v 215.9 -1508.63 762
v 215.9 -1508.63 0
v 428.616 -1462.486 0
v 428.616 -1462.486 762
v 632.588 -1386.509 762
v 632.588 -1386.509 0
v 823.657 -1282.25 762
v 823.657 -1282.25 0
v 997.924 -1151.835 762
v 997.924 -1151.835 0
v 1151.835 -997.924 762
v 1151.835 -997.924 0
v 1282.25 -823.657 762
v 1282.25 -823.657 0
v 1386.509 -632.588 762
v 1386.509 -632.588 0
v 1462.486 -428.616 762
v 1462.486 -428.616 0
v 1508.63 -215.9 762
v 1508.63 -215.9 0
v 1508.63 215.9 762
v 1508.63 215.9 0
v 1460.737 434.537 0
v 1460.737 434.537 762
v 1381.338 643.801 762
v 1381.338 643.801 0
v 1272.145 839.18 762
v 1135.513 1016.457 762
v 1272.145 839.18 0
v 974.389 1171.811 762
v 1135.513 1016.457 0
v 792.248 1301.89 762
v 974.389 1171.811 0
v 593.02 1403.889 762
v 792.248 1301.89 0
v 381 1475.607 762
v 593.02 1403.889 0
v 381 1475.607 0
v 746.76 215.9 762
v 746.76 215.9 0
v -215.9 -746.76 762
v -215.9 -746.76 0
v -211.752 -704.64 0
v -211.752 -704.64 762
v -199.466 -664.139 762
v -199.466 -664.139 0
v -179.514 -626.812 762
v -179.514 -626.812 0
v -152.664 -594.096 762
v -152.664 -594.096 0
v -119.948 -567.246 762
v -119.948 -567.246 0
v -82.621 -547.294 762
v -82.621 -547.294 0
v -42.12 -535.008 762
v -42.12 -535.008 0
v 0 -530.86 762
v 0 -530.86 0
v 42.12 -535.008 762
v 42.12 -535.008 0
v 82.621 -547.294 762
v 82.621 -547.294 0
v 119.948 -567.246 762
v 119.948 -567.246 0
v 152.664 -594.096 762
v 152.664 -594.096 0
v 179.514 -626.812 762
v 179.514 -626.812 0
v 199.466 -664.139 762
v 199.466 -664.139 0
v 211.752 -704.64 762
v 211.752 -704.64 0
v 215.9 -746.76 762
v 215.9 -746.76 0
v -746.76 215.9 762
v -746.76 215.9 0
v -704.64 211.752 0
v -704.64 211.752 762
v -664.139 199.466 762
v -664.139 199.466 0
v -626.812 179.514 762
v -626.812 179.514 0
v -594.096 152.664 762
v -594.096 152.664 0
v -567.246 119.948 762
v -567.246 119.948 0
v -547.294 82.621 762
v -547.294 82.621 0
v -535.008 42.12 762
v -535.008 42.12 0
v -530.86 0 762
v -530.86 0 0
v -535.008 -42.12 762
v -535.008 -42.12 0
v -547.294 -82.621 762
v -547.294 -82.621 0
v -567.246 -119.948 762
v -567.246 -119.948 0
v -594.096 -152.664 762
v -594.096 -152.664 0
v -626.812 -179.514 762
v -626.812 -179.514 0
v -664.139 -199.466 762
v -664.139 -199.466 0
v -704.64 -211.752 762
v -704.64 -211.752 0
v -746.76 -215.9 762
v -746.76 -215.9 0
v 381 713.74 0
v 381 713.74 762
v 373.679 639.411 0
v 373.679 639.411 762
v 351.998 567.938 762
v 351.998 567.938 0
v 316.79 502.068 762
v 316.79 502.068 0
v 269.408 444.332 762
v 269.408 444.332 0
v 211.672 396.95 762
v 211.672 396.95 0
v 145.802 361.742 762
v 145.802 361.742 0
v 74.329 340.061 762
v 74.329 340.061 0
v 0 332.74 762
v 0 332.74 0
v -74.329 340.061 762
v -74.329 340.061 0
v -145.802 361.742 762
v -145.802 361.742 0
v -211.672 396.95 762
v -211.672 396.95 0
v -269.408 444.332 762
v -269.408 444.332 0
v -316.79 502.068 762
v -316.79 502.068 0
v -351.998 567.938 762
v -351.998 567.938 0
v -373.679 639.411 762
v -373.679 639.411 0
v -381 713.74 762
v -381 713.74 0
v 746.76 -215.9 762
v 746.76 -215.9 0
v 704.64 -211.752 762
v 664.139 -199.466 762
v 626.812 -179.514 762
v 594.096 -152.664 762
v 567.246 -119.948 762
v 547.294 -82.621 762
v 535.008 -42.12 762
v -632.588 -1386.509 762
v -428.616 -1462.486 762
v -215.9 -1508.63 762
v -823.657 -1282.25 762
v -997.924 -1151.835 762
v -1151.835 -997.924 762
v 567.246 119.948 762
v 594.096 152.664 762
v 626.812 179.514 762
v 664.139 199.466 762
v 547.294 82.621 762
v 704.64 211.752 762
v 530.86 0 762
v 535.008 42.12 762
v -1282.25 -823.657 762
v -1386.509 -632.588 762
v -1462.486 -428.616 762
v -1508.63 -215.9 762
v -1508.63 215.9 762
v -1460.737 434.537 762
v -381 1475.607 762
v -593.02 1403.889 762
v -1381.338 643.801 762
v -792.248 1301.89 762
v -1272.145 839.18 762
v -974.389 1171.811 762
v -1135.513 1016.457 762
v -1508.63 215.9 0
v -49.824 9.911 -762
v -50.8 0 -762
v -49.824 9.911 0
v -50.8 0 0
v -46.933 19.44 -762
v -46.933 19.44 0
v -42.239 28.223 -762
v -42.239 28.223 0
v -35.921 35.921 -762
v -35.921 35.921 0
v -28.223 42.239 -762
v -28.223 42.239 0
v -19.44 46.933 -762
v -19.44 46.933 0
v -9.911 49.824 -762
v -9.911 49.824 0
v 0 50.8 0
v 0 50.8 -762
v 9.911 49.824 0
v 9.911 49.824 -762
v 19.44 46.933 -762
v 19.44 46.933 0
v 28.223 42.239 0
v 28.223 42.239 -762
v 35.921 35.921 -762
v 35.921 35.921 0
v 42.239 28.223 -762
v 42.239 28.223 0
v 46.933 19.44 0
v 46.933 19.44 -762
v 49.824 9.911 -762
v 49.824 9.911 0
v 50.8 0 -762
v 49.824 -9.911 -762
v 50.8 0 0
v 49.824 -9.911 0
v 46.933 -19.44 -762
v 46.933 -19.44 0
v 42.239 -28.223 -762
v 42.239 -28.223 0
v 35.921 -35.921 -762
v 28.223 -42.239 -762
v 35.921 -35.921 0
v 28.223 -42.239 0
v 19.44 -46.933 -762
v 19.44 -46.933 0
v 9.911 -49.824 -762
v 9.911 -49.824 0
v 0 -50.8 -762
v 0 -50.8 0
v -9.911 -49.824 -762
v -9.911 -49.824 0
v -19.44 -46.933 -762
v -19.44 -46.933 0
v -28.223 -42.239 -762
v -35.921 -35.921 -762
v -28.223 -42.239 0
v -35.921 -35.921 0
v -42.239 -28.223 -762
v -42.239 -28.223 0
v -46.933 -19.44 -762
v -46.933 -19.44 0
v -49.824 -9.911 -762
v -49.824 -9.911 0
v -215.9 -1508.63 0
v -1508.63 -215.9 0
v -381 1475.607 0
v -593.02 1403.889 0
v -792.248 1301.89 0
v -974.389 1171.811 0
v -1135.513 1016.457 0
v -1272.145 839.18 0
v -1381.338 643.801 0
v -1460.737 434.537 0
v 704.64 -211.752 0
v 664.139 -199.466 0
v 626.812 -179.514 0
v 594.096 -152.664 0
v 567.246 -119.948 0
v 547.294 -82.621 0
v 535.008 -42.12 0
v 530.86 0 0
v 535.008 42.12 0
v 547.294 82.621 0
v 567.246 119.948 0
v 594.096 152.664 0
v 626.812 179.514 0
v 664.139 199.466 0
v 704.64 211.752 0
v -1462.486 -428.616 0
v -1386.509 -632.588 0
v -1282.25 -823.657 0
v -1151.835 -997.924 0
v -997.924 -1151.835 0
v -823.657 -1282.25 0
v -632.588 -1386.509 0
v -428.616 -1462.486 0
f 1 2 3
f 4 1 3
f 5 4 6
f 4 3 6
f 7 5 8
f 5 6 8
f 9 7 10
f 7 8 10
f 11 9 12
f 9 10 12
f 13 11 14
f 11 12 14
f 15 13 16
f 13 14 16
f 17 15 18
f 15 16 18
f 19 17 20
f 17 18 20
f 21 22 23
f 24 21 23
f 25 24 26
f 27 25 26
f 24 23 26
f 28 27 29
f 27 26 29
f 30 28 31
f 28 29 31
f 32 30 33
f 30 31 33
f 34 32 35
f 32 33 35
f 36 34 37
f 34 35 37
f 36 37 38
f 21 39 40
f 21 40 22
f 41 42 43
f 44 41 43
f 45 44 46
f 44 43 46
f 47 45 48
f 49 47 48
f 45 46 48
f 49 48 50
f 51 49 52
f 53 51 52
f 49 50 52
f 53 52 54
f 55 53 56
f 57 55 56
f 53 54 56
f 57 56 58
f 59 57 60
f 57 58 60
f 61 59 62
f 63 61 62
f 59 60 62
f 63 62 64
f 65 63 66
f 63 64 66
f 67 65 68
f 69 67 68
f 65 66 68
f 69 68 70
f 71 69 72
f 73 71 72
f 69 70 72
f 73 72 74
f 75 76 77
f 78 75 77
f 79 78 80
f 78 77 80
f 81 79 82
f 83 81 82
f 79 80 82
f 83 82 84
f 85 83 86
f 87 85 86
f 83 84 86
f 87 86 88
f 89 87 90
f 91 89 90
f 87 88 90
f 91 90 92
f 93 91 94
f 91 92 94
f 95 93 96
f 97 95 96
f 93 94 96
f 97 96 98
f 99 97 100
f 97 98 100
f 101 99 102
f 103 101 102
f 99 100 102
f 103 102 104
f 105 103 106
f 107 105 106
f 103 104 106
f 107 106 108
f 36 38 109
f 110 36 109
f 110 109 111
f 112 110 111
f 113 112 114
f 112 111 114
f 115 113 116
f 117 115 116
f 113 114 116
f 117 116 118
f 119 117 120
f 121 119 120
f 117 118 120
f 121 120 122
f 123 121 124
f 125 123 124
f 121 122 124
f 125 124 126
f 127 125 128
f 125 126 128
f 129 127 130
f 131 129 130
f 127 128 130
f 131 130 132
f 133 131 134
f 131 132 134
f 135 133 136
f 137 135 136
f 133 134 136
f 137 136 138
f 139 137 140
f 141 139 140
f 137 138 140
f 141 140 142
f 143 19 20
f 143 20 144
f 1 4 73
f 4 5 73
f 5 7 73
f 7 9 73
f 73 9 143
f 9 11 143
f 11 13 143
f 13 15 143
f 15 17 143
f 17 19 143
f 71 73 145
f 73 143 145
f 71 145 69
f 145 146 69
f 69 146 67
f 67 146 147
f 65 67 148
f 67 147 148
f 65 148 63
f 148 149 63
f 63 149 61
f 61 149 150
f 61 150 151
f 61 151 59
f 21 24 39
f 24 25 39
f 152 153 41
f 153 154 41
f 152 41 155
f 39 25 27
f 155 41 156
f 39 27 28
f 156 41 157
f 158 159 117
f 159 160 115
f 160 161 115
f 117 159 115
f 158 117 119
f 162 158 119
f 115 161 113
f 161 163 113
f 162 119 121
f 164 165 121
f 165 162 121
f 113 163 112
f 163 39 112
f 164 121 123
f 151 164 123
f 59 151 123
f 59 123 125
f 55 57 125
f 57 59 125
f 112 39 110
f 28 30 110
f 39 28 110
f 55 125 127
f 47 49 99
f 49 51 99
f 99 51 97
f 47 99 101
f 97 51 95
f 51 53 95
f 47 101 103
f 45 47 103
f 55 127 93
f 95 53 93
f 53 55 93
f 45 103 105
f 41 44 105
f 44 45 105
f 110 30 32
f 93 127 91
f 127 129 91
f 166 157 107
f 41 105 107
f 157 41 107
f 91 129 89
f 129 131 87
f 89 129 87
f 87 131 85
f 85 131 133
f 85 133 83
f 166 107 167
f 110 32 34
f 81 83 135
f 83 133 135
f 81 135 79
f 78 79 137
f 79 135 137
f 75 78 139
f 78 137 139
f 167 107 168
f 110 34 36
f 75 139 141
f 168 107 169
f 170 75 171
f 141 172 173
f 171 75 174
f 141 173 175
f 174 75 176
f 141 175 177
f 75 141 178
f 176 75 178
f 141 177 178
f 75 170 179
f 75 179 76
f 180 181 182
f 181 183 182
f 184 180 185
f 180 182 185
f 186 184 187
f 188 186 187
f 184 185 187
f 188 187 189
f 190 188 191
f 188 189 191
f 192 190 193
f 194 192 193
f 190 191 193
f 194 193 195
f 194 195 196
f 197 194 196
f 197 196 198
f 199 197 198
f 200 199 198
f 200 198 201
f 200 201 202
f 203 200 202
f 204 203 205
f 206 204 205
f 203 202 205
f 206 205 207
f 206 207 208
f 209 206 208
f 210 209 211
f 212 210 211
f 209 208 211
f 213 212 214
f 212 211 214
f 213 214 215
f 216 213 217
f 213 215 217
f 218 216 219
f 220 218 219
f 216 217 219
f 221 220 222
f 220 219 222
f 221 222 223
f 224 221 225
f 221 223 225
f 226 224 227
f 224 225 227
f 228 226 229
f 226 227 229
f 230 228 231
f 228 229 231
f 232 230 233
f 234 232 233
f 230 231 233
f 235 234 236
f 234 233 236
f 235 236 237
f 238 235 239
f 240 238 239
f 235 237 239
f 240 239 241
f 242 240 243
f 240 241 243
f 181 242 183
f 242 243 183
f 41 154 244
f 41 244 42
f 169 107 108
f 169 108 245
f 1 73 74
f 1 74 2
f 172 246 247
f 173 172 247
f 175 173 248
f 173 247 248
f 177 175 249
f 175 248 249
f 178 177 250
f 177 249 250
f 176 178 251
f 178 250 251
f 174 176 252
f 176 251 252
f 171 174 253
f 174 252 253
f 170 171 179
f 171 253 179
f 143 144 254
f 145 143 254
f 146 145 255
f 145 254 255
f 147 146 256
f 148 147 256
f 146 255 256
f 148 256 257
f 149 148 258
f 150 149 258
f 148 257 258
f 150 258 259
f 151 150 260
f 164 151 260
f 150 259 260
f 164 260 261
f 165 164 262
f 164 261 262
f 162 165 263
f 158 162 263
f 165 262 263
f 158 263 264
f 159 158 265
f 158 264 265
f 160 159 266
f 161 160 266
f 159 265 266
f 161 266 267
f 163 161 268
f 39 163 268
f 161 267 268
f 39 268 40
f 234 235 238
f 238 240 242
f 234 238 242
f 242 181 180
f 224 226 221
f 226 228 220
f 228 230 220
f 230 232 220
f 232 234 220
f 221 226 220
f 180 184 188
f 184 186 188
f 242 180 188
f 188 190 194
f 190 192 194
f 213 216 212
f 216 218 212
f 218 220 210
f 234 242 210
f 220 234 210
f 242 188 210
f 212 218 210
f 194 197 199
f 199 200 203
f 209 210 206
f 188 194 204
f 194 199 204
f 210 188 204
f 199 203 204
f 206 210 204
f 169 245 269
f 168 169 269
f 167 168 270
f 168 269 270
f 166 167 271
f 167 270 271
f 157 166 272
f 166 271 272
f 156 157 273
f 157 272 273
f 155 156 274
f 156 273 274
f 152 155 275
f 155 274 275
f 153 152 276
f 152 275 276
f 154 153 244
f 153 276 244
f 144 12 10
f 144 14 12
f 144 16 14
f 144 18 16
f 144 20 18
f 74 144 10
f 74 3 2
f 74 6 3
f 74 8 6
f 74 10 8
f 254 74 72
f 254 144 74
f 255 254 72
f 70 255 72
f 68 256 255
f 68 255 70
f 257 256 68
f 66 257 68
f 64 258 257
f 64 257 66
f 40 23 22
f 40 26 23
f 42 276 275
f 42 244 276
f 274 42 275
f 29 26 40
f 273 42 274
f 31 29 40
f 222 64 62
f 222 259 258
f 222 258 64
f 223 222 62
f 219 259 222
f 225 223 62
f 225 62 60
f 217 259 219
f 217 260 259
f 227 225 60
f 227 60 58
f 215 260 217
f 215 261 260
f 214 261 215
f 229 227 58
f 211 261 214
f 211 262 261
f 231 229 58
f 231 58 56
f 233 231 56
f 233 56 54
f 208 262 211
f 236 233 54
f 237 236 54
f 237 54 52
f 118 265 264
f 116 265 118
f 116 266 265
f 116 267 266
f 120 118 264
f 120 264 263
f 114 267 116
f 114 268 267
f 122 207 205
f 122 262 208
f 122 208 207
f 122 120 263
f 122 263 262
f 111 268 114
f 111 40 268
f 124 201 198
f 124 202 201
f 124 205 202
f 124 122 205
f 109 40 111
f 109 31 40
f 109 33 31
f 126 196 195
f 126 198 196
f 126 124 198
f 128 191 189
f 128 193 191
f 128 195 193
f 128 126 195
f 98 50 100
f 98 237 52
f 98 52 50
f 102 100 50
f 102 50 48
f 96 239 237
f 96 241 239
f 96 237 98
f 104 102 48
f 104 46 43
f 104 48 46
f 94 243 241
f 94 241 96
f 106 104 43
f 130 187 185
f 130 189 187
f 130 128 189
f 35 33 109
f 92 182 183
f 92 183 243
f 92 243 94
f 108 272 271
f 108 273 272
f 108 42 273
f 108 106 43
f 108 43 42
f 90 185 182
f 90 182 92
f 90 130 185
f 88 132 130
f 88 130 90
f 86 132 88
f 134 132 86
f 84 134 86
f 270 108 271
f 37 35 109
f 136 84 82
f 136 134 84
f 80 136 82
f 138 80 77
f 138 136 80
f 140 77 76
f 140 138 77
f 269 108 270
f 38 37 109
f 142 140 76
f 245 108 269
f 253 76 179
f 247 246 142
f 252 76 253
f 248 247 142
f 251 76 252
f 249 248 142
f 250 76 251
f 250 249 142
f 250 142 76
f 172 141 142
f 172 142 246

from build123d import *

# Parameters (mm, degrees)
SKETCH1_W          = 1524
SKETCH1_H          = 762
CUT_EXTRUDE1_DEPTH = 2287
CUT_EXTRUDE2_DEPTH = 2287
CUT_EXTRUDE3_DEPTH = 2287
CUT_EXTRUDE4_DEPTH = 2276.781885419
SKETCH6_W          = 50.8
SKETCH6_H          = 762


with BuildPart() as part:
    # Sketch1 → Revolve1 (revolve)
    with BuildSketch(Plane(origin=(0, 0, 0), x_dir=(1, 0, 0), z_dir=(0, 1, 0))):
        with Locations((762, -381)):
            Rectangle(SKETCH1_W, SKETCH1_H)
    revolve(axis=Axis((0, 0, 0), (0, 0, 1)))

    # Sketch2 → Cut-Extrude1 (cut, through all)
    with BuildSketch(Plane(origin=(0, 0, 0), x_dir=(-1, 0, 0), z_dir=(0, 0, -1))):
        with BuildLine():
            Line((215.9, -1508.629573487), (215.9, -746.76))
            ThreePointArc((215.9, -746.76), (0, -530.86), (-215.9, -746.76))
            Line((-215.9, -746.76), (-215.9, -1508.629573487))
            ThreePointArc((-215.9, -1508.629573487), (0, -1524), (215.9, -1508.629573487))
        make_face()
    extrude(amount=-CUT_EXTRUDE1_DEPTH, mode=Mode.SUBTRACT)

    # Sketch3 → Cut-Extrude2 (cut, through all)
    with BuildSketch(Plane(origin=(0, 0, 0), x_dir=(-1, 0, 0), z_dir=(0, 0, -1))):
        with BuildLine():
            Line((-1508.629573487, -215.9), (-746.76, -215.9))
            ThreePointArc((-746.76, -215.9), (-530.86, 0), (-746.76, 215.9))
            Line((-746.76, 215.9), (-1508.629573487, 215.9))
            ThreePointArc((-1508.629573487, 215.9), (-1524, 0), (-1508.629573487, -215.9))
        make_face()
    extrude(amount=-CUT_EXTRUDE2_DEPTH, mode=Mode.SUBTRACT)

    # Sketch4 → Cut-Extrude3 (cut, through all)
    with BuildSketch(Plane(origin=(0, 0, 0), x_dir=(-1, 0, 0), z_dir=(0, 0, -1))):
        with BuildLine():
            Line((-381, 1475.606654905), (-381, 713.739999999))
            ThreePointArc((-381, 713.739999999), (0, 332.739999999), (381, 713.739999999))
            Line((381, 713.739999999), (381, 1475.606654905))
            ThreePointArc((381, 1475.606654905), (0, 1524), (-381, 1475.606654905))
        make_face()
    extrude(amount=-CUT_EXTRUDE3_DEPTH, mode=Mode.SUBTRACT)

    # Sketch5 → Cut-Extrude4 (cut, through all)
    with BuildSketch(Plane(origin=(0, 0, 0), x_dir=(-1, 0, 0), z_dir=(0, 0, -1))):
        with BuildLine():
            Line((1508.629573487, 215.9), (746.76, 215.9))
            ThreePointArc((746.76, 215.9), (530.86, 0), (746.76, -215.9))
            Line((746.76, -215.9), (1508.629573487, -215.9))
            ThreePointArc((1508.629573487, -215.9), (1524, 0), (1508.629573487, 215.9))
        make_face()
    extrude(amount=-CUT_EXTRUDE4_DEPTH, mode=Mode.SUBTRACT)

    # Sketch6 → Revolve2 (revolve)
    with BuildSketch(Plane.XZ, mode=Mode.PRIVATE) as revolve2_sk:
        with Locations((25.4, -381)):
            Rectangle(SKETCH6_W, SKETCH6_H)
    revolve(revolve2_sk.sketch.rotate(Axis((0, 0, 0), (0, 0, -1)), 180), axis=Axis((0, 0, 0), (0, 0, -1)))


solid = part.part
